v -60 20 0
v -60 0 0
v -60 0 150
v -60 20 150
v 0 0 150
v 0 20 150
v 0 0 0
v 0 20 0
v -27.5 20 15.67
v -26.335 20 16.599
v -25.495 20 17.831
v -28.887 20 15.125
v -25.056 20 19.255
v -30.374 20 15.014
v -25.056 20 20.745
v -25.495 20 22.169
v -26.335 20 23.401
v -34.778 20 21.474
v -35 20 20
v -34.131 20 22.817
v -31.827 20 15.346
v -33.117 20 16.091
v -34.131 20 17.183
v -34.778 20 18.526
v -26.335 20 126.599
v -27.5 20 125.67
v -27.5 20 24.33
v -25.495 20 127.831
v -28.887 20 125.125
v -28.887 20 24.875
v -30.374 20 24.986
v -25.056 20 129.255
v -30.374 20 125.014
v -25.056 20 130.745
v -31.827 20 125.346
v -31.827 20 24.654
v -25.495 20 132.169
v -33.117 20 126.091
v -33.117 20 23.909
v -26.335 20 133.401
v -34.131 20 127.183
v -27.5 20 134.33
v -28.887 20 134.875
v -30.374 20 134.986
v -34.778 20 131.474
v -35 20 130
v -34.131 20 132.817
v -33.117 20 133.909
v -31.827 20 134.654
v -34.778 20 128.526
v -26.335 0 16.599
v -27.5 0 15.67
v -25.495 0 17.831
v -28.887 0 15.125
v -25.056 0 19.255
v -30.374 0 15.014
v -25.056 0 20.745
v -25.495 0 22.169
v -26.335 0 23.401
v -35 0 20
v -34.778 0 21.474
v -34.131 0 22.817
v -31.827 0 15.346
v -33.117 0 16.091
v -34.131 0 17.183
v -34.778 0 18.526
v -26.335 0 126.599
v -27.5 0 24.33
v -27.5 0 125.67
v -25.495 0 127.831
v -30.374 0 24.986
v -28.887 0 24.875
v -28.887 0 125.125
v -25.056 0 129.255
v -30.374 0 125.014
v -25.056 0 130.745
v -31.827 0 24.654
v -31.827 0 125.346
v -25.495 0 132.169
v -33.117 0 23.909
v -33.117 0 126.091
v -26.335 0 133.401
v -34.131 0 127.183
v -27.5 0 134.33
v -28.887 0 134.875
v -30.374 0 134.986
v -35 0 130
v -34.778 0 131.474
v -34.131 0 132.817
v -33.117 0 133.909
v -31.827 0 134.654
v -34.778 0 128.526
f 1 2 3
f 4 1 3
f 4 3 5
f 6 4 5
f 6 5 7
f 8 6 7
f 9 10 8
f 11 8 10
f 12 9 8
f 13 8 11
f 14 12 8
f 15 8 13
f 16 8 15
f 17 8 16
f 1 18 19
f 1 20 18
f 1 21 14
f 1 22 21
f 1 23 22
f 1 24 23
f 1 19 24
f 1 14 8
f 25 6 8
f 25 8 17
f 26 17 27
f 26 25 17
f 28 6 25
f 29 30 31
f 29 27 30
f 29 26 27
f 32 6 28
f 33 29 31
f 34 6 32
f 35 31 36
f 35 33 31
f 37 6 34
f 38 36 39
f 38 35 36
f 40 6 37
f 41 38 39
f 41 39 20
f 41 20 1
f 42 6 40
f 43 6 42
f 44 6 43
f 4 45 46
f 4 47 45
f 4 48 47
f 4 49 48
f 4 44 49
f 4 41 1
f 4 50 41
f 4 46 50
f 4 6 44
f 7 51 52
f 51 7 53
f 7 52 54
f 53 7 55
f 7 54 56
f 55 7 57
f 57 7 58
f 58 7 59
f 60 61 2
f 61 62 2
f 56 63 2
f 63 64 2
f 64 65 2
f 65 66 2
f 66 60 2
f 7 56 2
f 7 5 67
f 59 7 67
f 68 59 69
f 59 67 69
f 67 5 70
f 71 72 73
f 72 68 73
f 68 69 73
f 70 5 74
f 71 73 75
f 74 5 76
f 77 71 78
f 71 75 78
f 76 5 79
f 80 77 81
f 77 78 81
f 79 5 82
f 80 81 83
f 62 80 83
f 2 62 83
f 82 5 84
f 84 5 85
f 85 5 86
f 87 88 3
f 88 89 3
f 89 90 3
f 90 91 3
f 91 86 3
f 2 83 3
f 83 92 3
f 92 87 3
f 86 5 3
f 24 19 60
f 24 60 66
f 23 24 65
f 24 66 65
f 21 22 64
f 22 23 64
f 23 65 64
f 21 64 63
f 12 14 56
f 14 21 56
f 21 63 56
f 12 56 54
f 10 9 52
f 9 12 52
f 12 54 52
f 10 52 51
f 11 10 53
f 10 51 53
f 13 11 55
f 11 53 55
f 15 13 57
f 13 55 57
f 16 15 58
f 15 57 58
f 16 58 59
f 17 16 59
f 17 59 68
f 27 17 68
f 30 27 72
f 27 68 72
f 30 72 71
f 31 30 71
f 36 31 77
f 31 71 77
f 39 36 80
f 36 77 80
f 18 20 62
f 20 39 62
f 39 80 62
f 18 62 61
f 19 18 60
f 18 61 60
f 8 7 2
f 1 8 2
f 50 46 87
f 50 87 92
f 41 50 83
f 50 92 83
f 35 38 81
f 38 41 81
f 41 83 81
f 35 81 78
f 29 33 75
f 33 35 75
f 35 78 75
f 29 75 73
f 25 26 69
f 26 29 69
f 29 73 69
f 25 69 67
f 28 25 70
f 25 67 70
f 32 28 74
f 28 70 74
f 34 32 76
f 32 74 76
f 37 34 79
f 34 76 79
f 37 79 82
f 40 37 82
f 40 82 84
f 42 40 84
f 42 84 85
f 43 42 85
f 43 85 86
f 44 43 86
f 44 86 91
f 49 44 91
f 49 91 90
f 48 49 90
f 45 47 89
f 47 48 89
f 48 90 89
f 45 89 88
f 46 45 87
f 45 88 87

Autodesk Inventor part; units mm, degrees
ref_plane "YZ Plane" through (0, 0, 0) normal (1, 0, 0) x (0, 1, 0)
ref_plane "XZ Plane" through (0, 0, 0) normal (0, 1, 0) x (-1, 0, 0)
ref_plane "XY Plane" through (0, 0, 0) normal (0, 0, 1) x (1, 0, 0)
sketch "Block1" plane through (0, 0, 0) normal (0, 0, 1) x (1, 0, 0)
  line L0 (-60.22, 0.22) -> (-60.22, -150.22)
  line L1 (-60.22, -150.22) -> (0.22, -150.22)
  line L2 (0.22, -150.22) -> (0.22, 0.22)
  line L3 (0.22, 0.22) -> (-60.22, 0.22)
  circle A0 centre (-30, -20) radius 5.22
  circle A1 centre (-30, -130) radius 5.22
  point P0 (-30, -75)
sketch "Sketch1" plane through (0, 0, 0) normal (0, 1, 0) x (-1, 0, 0)
  line L0 (0, 0) -> (60, 0)
  line L1 (60, 0) -> (60, 150)
  line L2 (60, 150) -> (0, 150)
  line L3 (0, 150) -> (0, 0)
  circle A0 centre (30, 130) radius 5
  circle A1 centre (30, 20) radius 5
  dimension "d0" = 60
  dimension "d1" = 150
  dimension "d4" = 10
  dimension "d5" = 10
  dimension "d6" = 20
  dimension "d7" = 20
  dimension "d8" = 30
  dimension "d11" = 30
extrude "Extrusion2" add sketch "Sketch1" along normal blind 20
sketch "Sketch2" plane through (0, 20, 0) normal (0, 1, 0) x (1, 0, 0)
  line L0 (0, -150) -> (0, 0) projected
  line L1 (-60, -150) -> (0, -150) projected
  line L2 (-60, 0) -> (-60, -150) projected
  circle A0 centre (-30, -130) radius 5 projected
  circle A1 centre (-30, -20) radius 5 projected
  line L3 (0, 0) -> (-60, 0) projected
sketch "DXF" plane through (0, 0, 0) normal (0, 1, 0) x (-1, 0, 0)
  point P0 (0, 0)
equation "\"d8\" = 0.5 * d0"
equation "\"d11\" = 0.5 * d0"
properties part number "holderBlock"
